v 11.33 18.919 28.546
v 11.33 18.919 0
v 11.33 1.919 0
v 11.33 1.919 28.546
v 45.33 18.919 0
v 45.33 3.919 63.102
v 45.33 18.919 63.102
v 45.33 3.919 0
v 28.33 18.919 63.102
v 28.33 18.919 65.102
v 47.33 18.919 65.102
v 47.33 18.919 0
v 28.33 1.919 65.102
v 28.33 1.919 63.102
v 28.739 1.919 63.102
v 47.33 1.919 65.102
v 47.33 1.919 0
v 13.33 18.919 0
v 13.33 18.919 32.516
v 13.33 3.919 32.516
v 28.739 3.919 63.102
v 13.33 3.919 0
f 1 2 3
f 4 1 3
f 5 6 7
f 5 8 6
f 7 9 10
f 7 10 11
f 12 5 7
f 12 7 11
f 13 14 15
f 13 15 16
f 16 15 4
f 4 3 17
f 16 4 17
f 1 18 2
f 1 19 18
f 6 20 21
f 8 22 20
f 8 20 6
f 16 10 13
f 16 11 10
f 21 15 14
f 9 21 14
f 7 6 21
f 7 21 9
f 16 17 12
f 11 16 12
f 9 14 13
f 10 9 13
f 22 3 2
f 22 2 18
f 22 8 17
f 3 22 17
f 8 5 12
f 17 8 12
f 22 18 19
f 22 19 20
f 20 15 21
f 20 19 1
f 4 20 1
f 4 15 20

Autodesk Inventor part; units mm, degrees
ref_plane "YZ Plane" through (0, 0, 0) normal (1, 0, 0) x (0, 1, 0)
ref_plane "XZ Plane" through (0, 0, 0) normal (0, 1, 0) x (-1, 0, 0)
ref_plane "XY Plane" through (0, 0, 0) normal (0, 0, 1) x (1, 0, 0)
sketch "Sketch1" plane through (0, 0, 0) normal (0, 0, 1) x (1, 0, 0)
  line L0 (13.3295, 18.9186) -> (13.3295, 3.9186)
  line L1 (13.3295, 3.9186) -> (45.3295, 3.9186)
  line L2 (45.3295, 3.9186) -> (45.3295, 18.9186)
  line L3 (11.3295, 18.9186) -> (11.3295, 1.9186)
  line L4 (11.3295, 1.9186) -> (47.3295, 1.9186)
  line L5 (47.3295, 1.9186) -> (47.3295, 18.9186)
  line L6 (13.3295, 18.9186) -> (11.3295, 18.9186)
  line L7 (45.3295, 18.9186) -> (47.3295, 18.9186)
  point P0 (0, 0)
  dimension "d0" = 15
  dimension "d1" = 32
  dimension "d2" = 2
extrude "Extrusion1" add sketch "Sketch1" along normal blind 100
sketch "Sketch2" plane through (13.3295, 3.9186, 0) normal (0, 1, 0) x (1, 0, 0)
  line L0 (34, -100) -> (32, -100) projected
  line L1 (34, -100) -> (-2.138, -28.2724)
  line L2 (34, -100) -> (114.3169, -100) construction
  line L3 (32, -100) -> (0, -100) projected
  line L4 (34, -100) -> (-2.138, -100)
  line L5 (-2.138, -100) -> (-2.138, -28.2724)
  line L6 (-2.138, -28.2724) -> (15.4098, -63.1016)
  line L7 (15.4098, -63.1016) -> (34, -63.1016)
  line L8 (34, 0) -> (34, -100) projected
  point P0 (-13.3295, 0)
  point P1 (0, -100)
  dimension "d5" = 116.74
  dimension "d6" = 63.26
  dimension "d9" = 39
extrude "Extrusion2" cut sketch "Sketch2" along normal through all both and the other way through all
sketch "Sketch3" plane through (45.3295, 3.9186, 0) normal (-1, 0, 0) x (0, 0, 1)
  line L0 (63.1016, 0) -> (63.1016, 15) projected
  line L1 (63.1016, 15) -> (65.1016, 15)
  line L2 (65.1016, 15) -> (65.1016, -2)
  line L3 (65.1016, -2) -> (63.1016, -2)
  line L4 (63.1016, -2) -> (63.1016, 15)
  point P0 (0, -3.9186)
  dimension "d10" = 2
  dimension "d11" = 17
extrude "Extrusion3" add sketch "Sketch3" along normal blind 17 and the other way blind 2
properties part number "outside2"
